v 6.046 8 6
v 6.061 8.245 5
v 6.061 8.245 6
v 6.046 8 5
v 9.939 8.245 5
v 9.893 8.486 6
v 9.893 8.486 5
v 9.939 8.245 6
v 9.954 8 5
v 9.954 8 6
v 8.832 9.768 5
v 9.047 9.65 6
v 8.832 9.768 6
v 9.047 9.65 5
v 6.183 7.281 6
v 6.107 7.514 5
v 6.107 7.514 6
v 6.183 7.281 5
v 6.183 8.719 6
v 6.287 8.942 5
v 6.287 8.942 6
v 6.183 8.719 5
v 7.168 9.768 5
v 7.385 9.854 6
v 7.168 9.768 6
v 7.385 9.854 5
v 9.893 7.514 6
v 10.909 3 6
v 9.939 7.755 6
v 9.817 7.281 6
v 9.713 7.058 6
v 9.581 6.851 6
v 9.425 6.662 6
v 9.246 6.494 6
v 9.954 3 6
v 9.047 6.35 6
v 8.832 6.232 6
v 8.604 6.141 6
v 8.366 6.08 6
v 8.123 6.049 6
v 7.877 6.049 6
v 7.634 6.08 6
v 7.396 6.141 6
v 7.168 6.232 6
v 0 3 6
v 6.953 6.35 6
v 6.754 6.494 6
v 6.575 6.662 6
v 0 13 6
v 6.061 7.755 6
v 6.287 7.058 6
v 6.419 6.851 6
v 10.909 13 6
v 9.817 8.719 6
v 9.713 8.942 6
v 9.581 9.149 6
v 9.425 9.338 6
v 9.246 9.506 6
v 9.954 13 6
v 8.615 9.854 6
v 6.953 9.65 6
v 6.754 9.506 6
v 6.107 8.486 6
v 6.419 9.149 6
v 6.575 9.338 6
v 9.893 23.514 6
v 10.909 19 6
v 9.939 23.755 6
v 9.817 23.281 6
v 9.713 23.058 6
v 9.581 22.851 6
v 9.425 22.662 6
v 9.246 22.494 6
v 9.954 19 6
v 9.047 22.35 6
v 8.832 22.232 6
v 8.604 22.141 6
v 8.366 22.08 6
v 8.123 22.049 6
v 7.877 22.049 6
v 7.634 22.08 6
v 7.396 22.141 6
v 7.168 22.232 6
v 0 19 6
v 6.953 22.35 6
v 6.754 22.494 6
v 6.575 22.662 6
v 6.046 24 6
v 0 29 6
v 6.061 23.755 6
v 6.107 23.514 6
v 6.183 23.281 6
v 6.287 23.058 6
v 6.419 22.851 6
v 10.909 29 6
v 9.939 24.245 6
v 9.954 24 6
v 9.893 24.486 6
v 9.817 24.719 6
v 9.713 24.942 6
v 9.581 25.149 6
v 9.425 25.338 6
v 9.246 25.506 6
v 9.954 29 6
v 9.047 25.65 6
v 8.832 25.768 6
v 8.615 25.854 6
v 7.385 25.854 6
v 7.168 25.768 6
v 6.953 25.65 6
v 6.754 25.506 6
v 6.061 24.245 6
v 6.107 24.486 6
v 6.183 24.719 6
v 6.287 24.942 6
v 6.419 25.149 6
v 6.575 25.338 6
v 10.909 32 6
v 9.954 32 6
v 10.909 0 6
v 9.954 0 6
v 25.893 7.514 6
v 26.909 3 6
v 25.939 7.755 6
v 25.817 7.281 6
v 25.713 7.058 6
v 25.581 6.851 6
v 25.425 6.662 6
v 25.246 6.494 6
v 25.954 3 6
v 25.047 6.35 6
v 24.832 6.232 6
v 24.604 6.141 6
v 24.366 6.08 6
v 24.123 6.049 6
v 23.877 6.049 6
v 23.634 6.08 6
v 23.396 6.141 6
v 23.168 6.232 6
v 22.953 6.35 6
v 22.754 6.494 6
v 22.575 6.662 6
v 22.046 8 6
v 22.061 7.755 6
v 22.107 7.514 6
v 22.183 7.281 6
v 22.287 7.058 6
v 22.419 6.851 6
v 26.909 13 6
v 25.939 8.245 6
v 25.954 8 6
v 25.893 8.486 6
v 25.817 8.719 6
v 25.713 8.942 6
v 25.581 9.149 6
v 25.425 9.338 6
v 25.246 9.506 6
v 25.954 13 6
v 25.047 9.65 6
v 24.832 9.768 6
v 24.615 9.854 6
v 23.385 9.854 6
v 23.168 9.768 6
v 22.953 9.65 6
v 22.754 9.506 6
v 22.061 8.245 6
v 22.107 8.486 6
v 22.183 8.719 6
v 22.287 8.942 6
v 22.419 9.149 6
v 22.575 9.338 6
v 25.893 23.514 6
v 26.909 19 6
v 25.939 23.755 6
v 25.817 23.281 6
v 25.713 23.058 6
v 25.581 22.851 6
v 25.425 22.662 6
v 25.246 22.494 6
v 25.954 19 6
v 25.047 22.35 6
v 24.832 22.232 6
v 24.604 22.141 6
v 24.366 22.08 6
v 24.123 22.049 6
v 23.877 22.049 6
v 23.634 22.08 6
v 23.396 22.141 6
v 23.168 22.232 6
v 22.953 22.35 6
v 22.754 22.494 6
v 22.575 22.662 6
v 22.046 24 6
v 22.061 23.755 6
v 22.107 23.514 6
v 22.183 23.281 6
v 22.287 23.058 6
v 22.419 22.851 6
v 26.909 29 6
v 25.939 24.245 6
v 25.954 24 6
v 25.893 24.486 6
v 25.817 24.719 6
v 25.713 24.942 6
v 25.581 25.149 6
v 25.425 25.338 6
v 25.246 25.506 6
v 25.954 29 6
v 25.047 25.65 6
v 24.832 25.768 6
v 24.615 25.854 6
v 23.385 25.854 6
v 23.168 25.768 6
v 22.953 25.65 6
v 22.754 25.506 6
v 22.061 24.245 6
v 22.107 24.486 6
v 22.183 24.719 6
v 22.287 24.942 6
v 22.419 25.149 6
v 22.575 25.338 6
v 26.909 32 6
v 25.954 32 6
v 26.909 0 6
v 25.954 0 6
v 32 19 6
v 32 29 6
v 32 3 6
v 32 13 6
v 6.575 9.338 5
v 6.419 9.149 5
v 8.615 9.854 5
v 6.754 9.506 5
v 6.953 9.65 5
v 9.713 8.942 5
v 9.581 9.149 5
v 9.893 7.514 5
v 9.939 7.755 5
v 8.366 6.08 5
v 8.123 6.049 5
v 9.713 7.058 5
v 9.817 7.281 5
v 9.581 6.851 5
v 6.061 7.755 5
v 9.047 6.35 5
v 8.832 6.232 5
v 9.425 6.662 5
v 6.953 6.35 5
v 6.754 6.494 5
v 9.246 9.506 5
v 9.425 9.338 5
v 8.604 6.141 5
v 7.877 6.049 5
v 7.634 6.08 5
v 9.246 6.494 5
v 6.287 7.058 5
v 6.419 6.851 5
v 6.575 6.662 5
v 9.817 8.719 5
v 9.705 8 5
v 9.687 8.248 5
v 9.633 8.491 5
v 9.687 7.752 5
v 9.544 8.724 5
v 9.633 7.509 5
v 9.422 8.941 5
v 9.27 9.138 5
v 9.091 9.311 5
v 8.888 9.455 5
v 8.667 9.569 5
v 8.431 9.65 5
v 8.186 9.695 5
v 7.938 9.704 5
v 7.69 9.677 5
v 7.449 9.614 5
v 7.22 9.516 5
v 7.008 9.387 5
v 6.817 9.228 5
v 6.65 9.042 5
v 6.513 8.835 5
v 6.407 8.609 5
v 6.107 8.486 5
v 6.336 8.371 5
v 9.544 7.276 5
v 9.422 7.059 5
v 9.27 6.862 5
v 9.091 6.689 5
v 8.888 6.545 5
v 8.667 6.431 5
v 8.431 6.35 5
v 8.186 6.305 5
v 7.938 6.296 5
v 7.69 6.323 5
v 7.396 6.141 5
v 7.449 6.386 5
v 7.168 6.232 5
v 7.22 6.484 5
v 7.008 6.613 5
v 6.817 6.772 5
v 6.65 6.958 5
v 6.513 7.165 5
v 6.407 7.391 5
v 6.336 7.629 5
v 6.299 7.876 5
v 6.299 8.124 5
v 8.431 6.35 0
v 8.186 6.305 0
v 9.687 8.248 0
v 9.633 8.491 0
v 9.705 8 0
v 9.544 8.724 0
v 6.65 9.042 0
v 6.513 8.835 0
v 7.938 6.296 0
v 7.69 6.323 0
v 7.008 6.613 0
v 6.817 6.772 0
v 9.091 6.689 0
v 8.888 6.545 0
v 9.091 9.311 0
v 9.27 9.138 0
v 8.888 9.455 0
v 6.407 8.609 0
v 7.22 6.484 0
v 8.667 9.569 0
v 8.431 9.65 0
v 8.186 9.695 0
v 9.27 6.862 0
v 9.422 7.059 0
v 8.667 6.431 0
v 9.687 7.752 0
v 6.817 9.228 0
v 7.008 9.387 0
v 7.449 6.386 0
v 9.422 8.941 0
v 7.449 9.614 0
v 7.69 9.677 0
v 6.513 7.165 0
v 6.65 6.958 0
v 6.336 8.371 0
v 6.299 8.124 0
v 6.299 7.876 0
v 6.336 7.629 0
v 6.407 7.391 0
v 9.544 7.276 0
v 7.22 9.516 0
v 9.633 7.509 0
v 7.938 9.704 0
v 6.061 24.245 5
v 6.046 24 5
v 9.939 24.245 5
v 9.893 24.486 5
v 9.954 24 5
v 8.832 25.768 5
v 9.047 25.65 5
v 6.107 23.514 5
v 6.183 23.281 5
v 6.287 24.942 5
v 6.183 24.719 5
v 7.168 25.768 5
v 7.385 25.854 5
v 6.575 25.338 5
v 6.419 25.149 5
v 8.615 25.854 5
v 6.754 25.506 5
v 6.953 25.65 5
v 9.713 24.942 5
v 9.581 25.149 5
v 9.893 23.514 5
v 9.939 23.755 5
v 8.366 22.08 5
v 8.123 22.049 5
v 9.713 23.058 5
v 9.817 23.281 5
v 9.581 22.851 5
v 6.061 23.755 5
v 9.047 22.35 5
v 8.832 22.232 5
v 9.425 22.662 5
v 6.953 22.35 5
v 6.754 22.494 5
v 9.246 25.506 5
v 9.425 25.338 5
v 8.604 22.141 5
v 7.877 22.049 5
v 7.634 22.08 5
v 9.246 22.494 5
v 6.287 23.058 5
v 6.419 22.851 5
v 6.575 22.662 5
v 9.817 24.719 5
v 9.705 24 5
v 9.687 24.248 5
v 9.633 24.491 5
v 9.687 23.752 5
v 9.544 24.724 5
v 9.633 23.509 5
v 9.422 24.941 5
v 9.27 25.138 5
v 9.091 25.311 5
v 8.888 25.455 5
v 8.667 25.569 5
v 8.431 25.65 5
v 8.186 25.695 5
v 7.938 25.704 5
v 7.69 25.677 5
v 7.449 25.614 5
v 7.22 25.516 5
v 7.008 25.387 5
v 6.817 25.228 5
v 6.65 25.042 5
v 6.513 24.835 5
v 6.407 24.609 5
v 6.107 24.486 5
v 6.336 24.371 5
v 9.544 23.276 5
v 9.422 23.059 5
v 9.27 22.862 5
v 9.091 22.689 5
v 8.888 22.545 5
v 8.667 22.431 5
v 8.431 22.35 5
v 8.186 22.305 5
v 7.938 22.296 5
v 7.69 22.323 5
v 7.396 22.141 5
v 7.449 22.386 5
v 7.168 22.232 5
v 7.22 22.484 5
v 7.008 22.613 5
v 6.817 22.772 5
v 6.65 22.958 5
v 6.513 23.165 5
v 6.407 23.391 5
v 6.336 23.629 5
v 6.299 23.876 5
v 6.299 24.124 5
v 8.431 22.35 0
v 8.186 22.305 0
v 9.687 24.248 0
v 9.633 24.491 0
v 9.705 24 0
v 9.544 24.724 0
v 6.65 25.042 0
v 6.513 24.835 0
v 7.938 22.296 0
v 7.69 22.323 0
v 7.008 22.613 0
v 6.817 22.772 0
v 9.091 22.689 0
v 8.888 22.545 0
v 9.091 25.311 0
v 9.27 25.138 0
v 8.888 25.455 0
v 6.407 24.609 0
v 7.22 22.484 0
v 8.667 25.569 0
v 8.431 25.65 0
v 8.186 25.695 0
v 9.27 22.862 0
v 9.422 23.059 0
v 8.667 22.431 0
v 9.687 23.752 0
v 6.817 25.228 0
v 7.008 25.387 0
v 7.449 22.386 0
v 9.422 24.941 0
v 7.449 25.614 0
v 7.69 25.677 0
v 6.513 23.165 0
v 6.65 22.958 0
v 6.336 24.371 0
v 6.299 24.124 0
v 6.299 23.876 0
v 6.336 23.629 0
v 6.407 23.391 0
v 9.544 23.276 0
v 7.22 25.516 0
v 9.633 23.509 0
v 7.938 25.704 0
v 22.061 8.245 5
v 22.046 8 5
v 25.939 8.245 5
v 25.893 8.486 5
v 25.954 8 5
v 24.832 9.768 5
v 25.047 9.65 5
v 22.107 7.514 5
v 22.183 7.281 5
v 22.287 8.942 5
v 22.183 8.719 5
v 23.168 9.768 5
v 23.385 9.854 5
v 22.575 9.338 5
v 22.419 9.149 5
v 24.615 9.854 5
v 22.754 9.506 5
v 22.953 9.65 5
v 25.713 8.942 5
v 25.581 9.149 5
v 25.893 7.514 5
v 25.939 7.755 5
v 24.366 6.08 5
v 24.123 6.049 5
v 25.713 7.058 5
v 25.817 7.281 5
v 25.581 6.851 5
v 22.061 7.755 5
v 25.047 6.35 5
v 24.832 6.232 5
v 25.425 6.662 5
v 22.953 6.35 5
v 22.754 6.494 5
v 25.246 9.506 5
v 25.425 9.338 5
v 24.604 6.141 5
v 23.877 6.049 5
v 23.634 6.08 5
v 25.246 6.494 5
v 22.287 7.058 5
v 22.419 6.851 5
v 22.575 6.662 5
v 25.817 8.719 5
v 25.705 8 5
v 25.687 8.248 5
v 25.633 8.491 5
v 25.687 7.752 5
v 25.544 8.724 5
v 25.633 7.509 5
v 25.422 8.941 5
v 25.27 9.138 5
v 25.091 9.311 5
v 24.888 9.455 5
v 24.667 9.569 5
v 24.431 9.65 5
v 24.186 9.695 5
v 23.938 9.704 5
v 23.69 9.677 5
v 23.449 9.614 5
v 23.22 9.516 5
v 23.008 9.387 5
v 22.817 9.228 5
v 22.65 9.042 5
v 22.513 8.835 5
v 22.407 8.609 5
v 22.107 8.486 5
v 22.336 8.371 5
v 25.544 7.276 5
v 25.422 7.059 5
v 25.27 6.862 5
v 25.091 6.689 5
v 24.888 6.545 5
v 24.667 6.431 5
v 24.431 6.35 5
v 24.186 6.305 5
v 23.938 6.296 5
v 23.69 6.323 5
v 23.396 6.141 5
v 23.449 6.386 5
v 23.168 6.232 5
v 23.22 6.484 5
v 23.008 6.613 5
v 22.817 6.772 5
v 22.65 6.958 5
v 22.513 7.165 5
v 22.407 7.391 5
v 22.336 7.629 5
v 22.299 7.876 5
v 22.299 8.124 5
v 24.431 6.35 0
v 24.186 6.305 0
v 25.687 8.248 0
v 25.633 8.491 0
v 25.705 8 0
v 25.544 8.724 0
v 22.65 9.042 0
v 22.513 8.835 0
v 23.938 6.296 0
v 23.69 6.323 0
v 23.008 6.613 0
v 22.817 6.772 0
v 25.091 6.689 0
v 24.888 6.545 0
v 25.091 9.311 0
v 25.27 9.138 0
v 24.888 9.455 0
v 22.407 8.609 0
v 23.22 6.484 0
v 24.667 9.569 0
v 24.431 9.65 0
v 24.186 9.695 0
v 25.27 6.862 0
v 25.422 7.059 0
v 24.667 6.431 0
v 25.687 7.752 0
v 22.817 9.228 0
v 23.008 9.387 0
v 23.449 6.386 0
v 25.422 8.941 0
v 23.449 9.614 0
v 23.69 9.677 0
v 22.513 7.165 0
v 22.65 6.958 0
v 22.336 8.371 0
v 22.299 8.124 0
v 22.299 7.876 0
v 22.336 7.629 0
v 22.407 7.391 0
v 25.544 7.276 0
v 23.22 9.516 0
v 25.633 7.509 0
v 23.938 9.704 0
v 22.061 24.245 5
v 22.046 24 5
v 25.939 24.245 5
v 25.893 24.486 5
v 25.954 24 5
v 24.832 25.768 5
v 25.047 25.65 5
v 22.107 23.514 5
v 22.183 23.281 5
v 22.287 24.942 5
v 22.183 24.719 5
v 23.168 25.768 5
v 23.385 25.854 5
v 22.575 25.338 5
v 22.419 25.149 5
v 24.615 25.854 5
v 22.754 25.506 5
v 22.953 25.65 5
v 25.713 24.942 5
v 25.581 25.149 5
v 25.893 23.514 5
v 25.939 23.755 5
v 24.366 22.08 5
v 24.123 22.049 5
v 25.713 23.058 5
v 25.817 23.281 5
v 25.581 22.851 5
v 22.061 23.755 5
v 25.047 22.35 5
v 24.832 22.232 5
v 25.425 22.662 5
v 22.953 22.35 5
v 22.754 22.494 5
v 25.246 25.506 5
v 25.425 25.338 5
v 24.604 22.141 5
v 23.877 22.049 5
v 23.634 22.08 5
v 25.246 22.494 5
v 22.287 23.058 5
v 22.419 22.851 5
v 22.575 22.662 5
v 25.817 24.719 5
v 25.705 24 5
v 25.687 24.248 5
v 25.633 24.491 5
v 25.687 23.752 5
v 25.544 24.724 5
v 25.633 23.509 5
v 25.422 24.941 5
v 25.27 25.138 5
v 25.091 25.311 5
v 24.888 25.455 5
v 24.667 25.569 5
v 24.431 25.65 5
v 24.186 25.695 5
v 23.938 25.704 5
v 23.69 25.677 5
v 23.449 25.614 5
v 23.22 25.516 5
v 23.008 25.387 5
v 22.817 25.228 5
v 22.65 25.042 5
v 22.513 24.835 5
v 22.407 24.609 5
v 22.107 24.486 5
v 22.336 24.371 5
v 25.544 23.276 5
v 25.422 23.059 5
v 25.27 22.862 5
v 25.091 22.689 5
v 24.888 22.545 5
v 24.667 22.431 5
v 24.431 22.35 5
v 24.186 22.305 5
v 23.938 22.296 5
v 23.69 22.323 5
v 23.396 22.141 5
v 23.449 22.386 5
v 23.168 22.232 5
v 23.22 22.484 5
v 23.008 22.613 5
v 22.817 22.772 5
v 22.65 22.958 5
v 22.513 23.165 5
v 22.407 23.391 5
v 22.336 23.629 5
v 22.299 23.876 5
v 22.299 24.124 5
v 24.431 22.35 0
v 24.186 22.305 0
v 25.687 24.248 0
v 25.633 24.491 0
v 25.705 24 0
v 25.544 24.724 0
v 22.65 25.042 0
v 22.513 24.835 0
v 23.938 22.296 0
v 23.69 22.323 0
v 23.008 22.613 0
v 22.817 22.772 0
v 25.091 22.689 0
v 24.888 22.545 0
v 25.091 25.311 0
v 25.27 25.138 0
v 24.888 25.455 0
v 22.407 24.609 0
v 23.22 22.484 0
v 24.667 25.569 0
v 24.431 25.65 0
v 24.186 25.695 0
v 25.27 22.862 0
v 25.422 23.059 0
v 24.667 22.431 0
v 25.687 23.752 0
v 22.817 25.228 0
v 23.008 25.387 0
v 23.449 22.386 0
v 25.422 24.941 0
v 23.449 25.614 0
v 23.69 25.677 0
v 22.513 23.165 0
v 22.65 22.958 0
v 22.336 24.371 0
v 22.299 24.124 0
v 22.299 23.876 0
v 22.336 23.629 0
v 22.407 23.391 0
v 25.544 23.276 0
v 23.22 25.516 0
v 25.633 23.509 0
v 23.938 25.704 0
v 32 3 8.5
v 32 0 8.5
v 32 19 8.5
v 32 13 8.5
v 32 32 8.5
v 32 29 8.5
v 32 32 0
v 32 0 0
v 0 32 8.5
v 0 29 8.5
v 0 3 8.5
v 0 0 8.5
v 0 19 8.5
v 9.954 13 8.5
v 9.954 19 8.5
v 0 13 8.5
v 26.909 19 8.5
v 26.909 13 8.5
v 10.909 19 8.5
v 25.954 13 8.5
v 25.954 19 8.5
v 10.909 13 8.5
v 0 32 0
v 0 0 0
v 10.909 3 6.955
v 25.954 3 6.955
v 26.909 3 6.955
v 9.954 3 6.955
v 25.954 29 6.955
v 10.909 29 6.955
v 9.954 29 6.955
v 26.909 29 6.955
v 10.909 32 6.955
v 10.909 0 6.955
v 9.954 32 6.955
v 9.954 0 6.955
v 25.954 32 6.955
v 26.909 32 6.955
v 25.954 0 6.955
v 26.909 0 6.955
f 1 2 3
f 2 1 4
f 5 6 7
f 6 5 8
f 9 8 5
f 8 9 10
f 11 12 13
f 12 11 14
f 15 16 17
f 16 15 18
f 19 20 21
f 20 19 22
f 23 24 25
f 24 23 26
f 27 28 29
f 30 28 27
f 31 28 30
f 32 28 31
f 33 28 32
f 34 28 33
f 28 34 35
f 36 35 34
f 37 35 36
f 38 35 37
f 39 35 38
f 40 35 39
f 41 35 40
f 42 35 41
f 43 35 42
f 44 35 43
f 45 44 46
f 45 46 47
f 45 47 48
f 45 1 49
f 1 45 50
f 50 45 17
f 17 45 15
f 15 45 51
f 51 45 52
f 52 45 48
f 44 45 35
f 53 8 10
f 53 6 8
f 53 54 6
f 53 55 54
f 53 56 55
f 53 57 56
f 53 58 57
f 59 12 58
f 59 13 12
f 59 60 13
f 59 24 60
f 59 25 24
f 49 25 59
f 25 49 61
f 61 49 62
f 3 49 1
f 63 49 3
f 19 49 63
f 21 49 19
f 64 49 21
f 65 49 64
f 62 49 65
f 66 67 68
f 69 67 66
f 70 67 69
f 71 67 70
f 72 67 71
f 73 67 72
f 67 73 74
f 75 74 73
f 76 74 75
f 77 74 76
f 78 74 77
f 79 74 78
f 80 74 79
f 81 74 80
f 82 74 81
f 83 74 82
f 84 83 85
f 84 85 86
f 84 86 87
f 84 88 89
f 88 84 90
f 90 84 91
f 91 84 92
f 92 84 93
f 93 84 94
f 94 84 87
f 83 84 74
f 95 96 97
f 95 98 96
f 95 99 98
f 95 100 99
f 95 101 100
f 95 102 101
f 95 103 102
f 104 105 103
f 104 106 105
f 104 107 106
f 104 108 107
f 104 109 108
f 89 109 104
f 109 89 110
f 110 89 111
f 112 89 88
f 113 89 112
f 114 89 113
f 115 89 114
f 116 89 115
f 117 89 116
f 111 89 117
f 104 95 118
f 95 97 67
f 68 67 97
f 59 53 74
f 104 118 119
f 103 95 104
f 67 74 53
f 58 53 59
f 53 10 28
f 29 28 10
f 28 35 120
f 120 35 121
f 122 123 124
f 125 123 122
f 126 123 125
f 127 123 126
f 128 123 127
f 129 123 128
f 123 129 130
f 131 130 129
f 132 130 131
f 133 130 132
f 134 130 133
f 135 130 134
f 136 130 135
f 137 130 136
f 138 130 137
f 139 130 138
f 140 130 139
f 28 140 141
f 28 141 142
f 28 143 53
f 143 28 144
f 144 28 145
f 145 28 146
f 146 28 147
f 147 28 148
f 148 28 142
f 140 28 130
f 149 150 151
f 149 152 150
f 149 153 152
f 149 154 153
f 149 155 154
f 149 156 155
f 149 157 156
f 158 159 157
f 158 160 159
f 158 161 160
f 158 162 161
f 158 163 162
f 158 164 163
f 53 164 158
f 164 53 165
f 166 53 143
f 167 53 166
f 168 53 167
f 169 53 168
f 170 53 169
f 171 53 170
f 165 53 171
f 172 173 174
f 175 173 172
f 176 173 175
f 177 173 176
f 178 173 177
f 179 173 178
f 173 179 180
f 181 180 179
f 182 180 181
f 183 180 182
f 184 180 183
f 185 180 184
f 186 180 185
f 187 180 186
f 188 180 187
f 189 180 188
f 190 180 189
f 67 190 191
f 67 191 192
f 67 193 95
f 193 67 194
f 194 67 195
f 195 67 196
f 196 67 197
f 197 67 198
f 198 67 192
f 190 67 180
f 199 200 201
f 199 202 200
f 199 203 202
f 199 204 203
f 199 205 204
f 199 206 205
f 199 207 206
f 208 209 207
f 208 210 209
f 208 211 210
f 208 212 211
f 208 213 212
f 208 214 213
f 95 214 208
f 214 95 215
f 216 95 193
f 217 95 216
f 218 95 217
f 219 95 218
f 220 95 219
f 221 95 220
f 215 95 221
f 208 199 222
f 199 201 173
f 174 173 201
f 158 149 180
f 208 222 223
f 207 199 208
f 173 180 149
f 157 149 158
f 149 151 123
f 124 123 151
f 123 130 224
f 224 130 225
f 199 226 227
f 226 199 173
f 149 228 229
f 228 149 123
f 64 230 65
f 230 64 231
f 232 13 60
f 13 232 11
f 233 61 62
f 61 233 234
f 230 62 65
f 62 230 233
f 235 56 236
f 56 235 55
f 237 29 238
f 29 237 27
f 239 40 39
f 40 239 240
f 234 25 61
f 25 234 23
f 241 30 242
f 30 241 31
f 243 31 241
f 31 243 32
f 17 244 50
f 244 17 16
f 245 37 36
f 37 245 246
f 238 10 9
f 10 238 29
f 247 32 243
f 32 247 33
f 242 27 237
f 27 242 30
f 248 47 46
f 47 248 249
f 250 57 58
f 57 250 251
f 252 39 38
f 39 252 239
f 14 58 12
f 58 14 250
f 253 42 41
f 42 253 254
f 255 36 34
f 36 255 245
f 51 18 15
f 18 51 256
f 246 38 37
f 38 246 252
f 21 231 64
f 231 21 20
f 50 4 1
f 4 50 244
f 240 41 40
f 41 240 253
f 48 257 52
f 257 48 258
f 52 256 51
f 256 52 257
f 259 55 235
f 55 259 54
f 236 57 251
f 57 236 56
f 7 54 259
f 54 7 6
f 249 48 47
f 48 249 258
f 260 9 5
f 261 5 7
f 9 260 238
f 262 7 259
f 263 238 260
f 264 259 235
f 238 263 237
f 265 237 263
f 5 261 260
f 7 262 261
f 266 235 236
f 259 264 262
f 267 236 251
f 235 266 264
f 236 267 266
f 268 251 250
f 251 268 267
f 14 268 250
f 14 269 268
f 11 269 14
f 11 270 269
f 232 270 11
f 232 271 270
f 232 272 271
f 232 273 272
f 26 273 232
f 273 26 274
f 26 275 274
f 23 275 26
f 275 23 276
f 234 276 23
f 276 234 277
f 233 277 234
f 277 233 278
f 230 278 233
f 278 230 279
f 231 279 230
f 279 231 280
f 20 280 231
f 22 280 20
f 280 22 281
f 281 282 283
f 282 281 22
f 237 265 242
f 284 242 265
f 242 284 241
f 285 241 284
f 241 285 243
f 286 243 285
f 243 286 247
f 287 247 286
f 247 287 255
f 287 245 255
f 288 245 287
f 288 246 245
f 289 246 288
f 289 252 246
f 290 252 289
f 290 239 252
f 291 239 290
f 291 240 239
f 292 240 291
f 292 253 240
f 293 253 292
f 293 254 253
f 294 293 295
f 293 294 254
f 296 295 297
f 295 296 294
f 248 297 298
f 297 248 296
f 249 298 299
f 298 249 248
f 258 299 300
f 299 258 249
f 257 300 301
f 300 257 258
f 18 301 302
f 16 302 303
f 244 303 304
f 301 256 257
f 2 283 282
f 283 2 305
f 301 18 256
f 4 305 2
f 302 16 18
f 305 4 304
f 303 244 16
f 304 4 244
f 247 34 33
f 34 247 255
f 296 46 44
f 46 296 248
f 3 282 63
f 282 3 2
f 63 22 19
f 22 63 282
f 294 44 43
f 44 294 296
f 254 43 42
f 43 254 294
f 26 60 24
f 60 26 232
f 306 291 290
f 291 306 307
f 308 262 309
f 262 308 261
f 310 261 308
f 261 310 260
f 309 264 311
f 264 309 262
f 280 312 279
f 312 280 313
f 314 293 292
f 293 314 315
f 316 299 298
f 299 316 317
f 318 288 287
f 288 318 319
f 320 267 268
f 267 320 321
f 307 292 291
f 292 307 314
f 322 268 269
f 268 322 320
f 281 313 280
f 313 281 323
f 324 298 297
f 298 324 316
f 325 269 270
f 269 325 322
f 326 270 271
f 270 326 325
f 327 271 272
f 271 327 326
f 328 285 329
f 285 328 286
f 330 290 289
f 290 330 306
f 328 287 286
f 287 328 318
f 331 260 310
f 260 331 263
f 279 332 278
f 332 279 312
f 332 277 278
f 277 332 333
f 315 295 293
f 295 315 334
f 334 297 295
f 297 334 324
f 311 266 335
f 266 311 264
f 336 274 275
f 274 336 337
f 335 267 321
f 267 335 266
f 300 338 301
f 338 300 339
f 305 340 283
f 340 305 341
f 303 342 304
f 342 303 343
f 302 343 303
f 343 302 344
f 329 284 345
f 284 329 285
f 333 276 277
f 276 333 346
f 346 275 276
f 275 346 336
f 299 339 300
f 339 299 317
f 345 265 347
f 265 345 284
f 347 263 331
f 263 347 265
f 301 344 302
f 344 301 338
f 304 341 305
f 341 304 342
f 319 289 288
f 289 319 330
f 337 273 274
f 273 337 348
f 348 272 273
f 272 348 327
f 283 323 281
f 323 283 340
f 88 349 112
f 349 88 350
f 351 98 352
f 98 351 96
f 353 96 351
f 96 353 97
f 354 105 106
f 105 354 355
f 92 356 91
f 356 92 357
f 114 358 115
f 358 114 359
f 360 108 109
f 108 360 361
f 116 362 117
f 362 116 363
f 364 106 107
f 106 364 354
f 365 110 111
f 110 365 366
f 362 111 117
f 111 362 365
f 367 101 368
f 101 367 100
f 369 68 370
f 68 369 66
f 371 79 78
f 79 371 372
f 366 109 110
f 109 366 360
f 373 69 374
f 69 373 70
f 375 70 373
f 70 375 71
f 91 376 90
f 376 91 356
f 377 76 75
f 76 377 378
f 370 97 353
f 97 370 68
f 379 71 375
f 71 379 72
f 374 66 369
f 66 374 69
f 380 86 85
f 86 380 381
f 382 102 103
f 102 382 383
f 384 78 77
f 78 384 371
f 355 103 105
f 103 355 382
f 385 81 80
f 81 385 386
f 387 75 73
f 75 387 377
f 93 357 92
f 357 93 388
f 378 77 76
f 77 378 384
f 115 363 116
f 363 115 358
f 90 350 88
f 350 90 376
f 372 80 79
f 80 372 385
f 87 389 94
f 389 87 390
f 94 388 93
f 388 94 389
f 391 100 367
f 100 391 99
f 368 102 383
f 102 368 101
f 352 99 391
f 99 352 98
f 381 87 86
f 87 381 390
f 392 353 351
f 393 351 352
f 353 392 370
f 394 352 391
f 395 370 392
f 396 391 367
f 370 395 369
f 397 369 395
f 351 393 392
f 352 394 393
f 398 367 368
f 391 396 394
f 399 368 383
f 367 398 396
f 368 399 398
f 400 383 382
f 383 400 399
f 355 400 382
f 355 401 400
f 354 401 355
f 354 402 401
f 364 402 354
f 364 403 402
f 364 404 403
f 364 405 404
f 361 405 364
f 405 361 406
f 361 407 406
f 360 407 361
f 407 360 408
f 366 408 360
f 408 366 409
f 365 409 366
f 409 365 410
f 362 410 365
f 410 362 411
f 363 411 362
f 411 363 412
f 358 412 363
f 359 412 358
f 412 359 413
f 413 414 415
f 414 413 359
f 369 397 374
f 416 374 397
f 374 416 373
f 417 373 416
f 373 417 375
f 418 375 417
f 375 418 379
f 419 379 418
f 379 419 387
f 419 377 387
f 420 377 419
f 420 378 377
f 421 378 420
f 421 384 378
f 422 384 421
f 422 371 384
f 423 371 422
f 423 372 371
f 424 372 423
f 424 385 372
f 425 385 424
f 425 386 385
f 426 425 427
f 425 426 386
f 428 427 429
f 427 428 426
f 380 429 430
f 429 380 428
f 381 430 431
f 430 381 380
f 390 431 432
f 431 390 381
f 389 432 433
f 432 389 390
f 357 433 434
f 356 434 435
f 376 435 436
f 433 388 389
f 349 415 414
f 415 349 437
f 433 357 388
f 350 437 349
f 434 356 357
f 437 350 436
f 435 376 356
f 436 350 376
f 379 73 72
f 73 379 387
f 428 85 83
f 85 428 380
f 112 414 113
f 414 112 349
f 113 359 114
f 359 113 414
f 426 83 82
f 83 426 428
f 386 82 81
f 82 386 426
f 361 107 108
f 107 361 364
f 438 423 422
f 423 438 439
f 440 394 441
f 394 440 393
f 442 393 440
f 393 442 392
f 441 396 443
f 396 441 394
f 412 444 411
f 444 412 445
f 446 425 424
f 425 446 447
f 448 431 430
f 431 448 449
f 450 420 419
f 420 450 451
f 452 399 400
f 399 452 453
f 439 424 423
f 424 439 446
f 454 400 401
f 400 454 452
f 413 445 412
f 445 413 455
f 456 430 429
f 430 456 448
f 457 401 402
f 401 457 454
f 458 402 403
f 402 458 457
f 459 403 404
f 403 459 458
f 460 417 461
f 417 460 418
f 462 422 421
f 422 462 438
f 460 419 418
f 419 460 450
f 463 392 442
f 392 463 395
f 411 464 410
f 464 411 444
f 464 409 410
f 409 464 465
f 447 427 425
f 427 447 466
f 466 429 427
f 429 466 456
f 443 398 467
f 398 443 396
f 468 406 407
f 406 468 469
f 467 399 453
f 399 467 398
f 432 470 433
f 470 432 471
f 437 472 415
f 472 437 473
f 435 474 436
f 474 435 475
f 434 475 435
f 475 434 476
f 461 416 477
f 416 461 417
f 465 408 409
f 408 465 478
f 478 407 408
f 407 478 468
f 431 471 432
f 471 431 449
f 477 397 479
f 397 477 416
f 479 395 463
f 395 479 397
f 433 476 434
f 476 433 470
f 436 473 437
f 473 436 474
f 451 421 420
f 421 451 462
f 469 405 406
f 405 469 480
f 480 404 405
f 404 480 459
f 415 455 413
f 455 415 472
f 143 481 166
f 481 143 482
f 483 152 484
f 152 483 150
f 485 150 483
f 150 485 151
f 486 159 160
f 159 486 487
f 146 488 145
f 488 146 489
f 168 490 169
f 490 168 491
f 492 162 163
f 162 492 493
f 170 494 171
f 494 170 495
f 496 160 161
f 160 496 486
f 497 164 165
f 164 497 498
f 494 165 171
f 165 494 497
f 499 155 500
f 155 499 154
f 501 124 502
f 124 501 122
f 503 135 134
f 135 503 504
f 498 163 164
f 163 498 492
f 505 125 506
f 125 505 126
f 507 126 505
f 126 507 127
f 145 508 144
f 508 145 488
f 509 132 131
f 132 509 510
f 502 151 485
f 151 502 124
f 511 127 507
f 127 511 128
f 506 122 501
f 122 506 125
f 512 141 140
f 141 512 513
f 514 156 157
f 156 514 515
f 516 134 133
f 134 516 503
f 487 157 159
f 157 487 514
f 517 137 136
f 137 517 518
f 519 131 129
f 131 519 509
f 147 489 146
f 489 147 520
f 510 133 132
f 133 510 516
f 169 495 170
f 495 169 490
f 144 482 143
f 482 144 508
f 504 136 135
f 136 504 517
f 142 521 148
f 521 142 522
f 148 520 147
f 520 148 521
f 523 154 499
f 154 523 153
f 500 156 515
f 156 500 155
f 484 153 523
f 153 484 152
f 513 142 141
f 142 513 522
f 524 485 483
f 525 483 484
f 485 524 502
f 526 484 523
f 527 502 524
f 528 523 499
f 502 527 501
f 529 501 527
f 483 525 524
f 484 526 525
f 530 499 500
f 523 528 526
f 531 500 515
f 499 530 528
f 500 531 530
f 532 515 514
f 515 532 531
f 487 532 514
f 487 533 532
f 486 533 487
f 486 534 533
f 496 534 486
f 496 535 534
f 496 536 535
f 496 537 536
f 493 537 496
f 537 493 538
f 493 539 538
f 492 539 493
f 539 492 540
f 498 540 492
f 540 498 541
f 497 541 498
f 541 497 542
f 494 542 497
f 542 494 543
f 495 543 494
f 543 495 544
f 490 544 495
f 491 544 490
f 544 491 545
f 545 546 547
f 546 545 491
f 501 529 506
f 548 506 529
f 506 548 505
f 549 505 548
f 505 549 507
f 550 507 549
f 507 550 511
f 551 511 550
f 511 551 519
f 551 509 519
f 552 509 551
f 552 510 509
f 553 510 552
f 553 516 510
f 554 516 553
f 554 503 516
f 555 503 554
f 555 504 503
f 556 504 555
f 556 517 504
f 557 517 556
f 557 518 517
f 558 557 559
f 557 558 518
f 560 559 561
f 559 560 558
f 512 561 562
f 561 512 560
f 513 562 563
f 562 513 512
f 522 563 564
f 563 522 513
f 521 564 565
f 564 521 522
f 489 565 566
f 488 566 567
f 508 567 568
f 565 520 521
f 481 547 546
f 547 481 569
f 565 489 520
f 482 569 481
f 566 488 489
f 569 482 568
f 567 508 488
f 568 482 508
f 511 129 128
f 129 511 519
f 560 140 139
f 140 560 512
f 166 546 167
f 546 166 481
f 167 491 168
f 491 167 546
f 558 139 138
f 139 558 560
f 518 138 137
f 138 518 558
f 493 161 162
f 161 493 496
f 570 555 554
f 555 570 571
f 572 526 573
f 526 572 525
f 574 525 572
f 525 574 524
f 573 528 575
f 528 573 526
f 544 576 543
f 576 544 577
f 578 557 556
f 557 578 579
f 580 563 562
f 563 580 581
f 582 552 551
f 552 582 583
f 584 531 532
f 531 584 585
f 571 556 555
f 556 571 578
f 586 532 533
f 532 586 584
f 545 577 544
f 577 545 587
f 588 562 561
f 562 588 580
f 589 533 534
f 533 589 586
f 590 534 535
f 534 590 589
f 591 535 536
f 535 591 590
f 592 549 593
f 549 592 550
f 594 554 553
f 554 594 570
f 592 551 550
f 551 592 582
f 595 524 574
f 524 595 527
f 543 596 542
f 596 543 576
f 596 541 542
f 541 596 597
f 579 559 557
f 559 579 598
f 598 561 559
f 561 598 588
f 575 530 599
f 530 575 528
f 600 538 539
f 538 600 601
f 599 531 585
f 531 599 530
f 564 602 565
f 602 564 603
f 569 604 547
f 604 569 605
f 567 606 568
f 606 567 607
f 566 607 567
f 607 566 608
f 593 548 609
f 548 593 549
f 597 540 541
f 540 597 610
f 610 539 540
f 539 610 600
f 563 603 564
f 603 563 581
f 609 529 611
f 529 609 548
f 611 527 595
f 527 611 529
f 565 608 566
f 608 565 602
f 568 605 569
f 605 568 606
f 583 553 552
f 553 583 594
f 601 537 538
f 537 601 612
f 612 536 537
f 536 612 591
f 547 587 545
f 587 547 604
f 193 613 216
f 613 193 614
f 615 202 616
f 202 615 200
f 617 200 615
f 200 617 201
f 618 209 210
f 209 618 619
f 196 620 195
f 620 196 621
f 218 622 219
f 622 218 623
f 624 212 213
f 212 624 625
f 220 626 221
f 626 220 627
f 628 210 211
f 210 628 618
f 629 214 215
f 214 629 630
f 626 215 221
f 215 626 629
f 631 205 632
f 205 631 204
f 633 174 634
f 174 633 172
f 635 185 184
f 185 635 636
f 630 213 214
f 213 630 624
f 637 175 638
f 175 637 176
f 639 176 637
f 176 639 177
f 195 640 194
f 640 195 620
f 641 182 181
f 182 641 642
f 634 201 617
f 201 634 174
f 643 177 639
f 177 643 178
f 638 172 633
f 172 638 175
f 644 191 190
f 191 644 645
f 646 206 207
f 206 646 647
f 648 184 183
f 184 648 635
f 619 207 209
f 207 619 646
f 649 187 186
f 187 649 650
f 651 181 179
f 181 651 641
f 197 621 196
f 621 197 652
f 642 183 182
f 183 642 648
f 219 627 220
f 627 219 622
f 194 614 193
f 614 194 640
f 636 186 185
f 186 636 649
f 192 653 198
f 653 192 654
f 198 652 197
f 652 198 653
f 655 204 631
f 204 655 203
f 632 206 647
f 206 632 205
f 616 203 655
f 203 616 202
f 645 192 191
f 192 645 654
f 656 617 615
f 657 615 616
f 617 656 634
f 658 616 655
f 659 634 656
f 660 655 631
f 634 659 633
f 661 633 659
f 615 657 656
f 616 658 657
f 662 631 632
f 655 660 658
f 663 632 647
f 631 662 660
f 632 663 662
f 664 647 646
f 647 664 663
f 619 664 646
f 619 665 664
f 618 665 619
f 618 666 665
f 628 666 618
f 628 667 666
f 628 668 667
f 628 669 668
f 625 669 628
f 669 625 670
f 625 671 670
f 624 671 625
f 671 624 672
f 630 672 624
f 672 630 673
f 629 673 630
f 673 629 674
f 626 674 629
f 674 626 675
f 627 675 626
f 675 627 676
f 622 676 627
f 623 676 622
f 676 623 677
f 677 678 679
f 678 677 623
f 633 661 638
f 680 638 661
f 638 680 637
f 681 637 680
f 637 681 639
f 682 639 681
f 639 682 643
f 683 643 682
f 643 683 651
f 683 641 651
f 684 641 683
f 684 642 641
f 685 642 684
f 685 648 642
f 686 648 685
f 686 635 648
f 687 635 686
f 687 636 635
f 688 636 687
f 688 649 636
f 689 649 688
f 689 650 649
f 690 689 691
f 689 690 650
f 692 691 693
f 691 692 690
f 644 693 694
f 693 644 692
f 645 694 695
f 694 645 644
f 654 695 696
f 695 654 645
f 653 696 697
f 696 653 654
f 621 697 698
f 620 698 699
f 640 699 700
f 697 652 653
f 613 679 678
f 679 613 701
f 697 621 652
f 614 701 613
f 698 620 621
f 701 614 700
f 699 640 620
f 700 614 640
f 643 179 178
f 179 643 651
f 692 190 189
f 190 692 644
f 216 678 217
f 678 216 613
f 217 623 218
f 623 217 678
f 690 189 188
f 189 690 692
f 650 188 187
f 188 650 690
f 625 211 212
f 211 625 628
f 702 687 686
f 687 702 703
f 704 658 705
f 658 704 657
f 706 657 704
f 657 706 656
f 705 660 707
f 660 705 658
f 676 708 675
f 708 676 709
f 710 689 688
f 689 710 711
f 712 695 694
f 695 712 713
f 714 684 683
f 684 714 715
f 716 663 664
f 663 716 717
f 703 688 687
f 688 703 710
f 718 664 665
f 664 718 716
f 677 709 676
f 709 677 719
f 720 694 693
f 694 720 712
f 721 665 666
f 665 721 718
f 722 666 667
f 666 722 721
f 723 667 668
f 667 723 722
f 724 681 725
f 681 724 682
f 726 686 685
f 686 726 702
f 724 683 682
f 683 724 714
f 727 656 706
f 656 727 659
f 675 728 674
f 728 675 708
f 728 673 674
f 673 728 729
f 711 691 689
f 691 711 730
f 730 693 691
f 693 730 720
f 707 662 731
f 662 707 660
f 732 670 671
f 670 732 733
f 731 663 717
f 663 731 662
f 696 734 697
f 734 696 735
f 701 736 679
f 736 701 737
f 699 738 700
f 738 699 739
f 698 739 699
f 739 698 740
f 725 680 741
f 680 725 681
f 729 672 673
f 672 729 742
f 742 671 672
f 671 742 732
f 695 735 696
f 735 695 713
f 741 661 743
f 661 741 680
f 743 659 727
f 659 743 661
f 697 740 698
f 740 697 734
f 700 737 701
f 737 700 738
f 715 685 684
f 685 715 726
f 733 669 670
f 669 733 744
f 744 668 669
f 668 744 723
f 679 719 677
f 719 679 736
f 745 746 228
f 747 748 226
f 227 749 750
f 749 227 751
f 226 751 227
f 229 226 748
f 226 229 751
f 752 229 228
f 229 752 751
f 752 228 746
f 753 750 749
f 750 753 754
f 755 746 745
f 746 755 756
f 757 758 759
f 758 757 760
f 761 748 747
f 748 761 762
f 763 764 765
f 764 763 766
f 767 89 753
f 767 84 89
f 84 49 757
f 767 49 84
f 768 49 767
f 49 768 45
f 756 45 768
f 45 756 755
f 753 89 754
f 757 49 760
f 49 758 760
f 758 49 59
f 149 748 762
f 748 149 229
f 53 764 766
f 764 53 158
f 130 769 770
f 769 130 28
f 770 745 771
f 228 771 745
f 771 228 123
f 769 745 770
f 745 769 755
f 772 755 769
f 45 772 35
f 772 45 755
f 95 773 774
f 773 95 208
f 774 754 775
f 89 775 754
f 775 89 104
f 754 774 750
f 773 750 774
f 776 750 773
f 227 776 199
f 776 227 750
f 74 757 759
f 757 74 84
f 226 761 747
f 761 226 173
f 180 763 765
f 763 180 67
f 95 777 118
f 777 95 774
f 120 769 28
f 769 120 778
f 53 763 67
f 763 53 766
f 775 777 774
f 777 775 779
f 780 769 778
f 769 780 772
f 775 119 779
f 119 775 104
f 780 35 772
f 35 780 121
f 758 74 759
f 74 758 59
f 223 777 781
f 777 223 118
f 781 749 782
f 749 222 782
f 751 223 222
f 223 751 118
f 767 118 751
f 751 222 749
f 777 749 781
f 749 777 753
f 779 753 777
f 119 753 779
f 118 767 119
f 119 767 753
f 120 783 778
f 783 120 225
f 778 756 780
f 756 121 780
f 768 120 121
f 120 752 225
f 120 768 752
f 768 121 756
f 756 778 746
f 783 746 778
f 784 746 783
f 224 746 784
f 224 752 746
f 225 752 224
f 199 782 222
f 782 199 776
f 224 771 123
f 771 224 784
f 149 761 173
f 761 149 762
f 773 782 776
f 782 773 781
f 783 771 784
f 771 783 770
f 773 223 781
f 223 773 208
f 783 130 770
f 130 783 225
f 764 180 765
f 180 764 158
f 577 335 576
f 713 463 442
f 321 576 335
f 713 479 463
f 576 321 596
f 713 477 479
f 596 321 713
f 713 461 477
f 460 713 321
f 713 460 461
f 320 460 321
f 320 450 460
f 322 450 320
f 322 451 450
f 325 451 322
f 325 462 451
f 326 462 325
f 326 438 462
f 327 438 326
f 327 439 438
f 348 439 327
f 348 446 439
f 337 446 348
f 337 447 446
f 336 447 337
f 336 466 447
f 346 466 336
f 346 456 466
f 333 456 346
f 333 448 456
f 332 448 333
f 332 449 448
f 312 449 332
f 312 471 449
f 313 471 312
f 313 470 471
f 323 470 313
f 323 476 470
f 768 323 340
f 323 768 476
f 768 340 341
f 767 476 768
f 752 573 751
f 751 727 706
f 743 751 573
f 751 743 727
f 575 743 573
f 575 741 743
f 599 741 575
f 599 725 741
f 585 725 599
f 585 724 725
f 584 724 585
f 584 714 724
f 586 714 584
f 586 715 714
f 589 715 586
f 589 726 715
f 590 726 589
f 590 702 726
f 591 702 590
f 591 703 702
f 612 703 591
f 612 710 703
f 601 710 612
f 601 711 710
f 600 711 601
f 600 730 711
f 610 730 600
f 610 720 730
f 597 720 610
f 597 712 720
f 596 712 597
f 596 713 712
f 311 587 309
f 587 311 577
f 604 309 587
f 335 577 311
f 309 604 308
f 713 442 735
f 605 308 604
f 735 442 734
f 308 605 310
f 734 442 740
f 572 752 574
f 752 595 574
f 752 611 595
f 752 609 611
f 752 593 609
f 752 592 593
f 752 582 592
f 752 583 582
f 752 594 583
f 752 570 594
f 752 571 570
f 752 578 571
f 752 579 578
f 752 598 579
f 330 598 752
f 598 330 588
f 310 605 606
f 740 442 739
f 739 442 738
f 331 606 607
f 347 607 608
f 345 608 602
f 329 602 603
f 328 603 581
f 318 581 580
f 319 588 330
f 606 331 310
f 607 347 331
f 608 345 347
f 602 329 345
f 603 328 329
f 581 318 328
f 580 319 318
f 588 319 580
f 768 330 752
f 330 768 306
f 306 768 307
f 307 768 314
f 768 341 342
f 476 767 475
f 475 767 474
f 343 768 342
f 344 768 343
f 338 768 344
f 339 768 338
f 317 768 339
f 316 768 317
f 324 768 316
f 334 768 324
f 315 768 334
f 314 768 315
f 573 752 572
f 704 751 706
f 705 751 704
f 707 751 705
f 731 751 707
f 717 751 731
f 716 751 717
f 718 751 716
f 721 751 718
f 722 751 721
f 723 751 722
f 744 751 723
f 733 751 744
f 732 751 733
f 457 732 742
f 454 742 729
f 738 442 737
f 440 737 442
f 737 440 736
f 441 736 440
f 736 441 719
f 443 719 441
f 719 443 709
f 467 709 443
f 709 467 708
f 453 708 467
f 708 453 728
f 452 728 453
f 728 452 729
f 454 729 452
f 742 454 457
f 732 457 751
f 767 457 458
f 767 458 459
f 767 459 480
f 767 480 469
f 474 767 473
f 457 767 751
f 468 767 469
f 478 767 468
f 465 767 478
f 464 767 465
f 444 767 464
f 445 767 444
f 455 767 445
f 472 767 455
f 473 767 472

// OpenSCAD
$fs = 0.25;
$fa = 1;

$rows = 2;
$columns = 2;
$height = 8.5;
$distance = 16;
$gutter = 8;

$led_diameter = 3;
$led_height = 5;
$flange_height = 1;
$flange_diameter = 3.5;
$flange_flat_diameter = 3.4;
$snug_clearance = 0.2;
$lead_diameter = 0.5;

$wire_guide_distance = 3;
$wire_guide_height = 2.5;

function width(holes) = (holes - 1) * $distance + 2 * $gutter;

function fragments(diameter) = $fn > 0.0 ? max(3.0, $fn) : ceil(max(min(360.0 / $fa, diameter * PI / $fs), 5));
function snugly(diameter) = diameter / cos(180 / fragments(diameter)) + 2 * $snug_clearance;

module hole() {
    translate([0, 0, $height - $wire_guide_height - $flange_height]) {
        difference() {
            cylinder(h = $flange_height, d = snugly($flange_diameter));
            translate([-snugly($flange_diameter)/2,
                       snugly($flange_diameter)/2 - ($flange_diameter - $flange_flat_diameter),
                       0]) {
                cube([$flange_diameter, $flange_diameter - $led_diameter, $flange_height]);
            }
        }
    }
    translate([0, 0, $height - $wire_guide_height - $led_height - 2]) {
        cylinder(h = $led_height + 2, d = snugly($led_diameter));
    }
}

module base(rows, columns) {
    cube([width(rows), width(columns), $height]);
}

module tool(rows, columns) {
    difference() {
        base(rows, columns);
        for (i = [0:rows - 1]) {
            for (j = [0:columns - 1]) {
                translate([$gutter + i * $distance, $gutter + j * $distance, 0]) {
                    hole();
                }
            }
        }
        for (j = [0:columns - 1]) {
            translate([0, $gutter + j * $distance - $distance/2 + $wire_guide_distance, $height - $wire_guide_height]) {
                cube([width(rows), $distance - 2 * $wire_guide_distance, $wire_guide_height]);
            }
        }
        for (i = [0:rows - 1]) {
            translate([$gutter + i * $distance + snugly($flange_diameter)/2, 0, $height - $wire_guide_height]) {
                cube([snugly($lead_diameter), width(columns), snugly($lead_diameter)]);
            }
            translate([$gutter + i * $distance + snugly($flange_diameter)/2, $gutter, $height - $wire_guide_height]) {
                cube([snugly($lead_diameter), (columns - 1) * $distance, $wire_guide_height]);
            }
        }
    }
}

tool($rows, $columns);

// vim:set sts=4 sw=4 ai et:
